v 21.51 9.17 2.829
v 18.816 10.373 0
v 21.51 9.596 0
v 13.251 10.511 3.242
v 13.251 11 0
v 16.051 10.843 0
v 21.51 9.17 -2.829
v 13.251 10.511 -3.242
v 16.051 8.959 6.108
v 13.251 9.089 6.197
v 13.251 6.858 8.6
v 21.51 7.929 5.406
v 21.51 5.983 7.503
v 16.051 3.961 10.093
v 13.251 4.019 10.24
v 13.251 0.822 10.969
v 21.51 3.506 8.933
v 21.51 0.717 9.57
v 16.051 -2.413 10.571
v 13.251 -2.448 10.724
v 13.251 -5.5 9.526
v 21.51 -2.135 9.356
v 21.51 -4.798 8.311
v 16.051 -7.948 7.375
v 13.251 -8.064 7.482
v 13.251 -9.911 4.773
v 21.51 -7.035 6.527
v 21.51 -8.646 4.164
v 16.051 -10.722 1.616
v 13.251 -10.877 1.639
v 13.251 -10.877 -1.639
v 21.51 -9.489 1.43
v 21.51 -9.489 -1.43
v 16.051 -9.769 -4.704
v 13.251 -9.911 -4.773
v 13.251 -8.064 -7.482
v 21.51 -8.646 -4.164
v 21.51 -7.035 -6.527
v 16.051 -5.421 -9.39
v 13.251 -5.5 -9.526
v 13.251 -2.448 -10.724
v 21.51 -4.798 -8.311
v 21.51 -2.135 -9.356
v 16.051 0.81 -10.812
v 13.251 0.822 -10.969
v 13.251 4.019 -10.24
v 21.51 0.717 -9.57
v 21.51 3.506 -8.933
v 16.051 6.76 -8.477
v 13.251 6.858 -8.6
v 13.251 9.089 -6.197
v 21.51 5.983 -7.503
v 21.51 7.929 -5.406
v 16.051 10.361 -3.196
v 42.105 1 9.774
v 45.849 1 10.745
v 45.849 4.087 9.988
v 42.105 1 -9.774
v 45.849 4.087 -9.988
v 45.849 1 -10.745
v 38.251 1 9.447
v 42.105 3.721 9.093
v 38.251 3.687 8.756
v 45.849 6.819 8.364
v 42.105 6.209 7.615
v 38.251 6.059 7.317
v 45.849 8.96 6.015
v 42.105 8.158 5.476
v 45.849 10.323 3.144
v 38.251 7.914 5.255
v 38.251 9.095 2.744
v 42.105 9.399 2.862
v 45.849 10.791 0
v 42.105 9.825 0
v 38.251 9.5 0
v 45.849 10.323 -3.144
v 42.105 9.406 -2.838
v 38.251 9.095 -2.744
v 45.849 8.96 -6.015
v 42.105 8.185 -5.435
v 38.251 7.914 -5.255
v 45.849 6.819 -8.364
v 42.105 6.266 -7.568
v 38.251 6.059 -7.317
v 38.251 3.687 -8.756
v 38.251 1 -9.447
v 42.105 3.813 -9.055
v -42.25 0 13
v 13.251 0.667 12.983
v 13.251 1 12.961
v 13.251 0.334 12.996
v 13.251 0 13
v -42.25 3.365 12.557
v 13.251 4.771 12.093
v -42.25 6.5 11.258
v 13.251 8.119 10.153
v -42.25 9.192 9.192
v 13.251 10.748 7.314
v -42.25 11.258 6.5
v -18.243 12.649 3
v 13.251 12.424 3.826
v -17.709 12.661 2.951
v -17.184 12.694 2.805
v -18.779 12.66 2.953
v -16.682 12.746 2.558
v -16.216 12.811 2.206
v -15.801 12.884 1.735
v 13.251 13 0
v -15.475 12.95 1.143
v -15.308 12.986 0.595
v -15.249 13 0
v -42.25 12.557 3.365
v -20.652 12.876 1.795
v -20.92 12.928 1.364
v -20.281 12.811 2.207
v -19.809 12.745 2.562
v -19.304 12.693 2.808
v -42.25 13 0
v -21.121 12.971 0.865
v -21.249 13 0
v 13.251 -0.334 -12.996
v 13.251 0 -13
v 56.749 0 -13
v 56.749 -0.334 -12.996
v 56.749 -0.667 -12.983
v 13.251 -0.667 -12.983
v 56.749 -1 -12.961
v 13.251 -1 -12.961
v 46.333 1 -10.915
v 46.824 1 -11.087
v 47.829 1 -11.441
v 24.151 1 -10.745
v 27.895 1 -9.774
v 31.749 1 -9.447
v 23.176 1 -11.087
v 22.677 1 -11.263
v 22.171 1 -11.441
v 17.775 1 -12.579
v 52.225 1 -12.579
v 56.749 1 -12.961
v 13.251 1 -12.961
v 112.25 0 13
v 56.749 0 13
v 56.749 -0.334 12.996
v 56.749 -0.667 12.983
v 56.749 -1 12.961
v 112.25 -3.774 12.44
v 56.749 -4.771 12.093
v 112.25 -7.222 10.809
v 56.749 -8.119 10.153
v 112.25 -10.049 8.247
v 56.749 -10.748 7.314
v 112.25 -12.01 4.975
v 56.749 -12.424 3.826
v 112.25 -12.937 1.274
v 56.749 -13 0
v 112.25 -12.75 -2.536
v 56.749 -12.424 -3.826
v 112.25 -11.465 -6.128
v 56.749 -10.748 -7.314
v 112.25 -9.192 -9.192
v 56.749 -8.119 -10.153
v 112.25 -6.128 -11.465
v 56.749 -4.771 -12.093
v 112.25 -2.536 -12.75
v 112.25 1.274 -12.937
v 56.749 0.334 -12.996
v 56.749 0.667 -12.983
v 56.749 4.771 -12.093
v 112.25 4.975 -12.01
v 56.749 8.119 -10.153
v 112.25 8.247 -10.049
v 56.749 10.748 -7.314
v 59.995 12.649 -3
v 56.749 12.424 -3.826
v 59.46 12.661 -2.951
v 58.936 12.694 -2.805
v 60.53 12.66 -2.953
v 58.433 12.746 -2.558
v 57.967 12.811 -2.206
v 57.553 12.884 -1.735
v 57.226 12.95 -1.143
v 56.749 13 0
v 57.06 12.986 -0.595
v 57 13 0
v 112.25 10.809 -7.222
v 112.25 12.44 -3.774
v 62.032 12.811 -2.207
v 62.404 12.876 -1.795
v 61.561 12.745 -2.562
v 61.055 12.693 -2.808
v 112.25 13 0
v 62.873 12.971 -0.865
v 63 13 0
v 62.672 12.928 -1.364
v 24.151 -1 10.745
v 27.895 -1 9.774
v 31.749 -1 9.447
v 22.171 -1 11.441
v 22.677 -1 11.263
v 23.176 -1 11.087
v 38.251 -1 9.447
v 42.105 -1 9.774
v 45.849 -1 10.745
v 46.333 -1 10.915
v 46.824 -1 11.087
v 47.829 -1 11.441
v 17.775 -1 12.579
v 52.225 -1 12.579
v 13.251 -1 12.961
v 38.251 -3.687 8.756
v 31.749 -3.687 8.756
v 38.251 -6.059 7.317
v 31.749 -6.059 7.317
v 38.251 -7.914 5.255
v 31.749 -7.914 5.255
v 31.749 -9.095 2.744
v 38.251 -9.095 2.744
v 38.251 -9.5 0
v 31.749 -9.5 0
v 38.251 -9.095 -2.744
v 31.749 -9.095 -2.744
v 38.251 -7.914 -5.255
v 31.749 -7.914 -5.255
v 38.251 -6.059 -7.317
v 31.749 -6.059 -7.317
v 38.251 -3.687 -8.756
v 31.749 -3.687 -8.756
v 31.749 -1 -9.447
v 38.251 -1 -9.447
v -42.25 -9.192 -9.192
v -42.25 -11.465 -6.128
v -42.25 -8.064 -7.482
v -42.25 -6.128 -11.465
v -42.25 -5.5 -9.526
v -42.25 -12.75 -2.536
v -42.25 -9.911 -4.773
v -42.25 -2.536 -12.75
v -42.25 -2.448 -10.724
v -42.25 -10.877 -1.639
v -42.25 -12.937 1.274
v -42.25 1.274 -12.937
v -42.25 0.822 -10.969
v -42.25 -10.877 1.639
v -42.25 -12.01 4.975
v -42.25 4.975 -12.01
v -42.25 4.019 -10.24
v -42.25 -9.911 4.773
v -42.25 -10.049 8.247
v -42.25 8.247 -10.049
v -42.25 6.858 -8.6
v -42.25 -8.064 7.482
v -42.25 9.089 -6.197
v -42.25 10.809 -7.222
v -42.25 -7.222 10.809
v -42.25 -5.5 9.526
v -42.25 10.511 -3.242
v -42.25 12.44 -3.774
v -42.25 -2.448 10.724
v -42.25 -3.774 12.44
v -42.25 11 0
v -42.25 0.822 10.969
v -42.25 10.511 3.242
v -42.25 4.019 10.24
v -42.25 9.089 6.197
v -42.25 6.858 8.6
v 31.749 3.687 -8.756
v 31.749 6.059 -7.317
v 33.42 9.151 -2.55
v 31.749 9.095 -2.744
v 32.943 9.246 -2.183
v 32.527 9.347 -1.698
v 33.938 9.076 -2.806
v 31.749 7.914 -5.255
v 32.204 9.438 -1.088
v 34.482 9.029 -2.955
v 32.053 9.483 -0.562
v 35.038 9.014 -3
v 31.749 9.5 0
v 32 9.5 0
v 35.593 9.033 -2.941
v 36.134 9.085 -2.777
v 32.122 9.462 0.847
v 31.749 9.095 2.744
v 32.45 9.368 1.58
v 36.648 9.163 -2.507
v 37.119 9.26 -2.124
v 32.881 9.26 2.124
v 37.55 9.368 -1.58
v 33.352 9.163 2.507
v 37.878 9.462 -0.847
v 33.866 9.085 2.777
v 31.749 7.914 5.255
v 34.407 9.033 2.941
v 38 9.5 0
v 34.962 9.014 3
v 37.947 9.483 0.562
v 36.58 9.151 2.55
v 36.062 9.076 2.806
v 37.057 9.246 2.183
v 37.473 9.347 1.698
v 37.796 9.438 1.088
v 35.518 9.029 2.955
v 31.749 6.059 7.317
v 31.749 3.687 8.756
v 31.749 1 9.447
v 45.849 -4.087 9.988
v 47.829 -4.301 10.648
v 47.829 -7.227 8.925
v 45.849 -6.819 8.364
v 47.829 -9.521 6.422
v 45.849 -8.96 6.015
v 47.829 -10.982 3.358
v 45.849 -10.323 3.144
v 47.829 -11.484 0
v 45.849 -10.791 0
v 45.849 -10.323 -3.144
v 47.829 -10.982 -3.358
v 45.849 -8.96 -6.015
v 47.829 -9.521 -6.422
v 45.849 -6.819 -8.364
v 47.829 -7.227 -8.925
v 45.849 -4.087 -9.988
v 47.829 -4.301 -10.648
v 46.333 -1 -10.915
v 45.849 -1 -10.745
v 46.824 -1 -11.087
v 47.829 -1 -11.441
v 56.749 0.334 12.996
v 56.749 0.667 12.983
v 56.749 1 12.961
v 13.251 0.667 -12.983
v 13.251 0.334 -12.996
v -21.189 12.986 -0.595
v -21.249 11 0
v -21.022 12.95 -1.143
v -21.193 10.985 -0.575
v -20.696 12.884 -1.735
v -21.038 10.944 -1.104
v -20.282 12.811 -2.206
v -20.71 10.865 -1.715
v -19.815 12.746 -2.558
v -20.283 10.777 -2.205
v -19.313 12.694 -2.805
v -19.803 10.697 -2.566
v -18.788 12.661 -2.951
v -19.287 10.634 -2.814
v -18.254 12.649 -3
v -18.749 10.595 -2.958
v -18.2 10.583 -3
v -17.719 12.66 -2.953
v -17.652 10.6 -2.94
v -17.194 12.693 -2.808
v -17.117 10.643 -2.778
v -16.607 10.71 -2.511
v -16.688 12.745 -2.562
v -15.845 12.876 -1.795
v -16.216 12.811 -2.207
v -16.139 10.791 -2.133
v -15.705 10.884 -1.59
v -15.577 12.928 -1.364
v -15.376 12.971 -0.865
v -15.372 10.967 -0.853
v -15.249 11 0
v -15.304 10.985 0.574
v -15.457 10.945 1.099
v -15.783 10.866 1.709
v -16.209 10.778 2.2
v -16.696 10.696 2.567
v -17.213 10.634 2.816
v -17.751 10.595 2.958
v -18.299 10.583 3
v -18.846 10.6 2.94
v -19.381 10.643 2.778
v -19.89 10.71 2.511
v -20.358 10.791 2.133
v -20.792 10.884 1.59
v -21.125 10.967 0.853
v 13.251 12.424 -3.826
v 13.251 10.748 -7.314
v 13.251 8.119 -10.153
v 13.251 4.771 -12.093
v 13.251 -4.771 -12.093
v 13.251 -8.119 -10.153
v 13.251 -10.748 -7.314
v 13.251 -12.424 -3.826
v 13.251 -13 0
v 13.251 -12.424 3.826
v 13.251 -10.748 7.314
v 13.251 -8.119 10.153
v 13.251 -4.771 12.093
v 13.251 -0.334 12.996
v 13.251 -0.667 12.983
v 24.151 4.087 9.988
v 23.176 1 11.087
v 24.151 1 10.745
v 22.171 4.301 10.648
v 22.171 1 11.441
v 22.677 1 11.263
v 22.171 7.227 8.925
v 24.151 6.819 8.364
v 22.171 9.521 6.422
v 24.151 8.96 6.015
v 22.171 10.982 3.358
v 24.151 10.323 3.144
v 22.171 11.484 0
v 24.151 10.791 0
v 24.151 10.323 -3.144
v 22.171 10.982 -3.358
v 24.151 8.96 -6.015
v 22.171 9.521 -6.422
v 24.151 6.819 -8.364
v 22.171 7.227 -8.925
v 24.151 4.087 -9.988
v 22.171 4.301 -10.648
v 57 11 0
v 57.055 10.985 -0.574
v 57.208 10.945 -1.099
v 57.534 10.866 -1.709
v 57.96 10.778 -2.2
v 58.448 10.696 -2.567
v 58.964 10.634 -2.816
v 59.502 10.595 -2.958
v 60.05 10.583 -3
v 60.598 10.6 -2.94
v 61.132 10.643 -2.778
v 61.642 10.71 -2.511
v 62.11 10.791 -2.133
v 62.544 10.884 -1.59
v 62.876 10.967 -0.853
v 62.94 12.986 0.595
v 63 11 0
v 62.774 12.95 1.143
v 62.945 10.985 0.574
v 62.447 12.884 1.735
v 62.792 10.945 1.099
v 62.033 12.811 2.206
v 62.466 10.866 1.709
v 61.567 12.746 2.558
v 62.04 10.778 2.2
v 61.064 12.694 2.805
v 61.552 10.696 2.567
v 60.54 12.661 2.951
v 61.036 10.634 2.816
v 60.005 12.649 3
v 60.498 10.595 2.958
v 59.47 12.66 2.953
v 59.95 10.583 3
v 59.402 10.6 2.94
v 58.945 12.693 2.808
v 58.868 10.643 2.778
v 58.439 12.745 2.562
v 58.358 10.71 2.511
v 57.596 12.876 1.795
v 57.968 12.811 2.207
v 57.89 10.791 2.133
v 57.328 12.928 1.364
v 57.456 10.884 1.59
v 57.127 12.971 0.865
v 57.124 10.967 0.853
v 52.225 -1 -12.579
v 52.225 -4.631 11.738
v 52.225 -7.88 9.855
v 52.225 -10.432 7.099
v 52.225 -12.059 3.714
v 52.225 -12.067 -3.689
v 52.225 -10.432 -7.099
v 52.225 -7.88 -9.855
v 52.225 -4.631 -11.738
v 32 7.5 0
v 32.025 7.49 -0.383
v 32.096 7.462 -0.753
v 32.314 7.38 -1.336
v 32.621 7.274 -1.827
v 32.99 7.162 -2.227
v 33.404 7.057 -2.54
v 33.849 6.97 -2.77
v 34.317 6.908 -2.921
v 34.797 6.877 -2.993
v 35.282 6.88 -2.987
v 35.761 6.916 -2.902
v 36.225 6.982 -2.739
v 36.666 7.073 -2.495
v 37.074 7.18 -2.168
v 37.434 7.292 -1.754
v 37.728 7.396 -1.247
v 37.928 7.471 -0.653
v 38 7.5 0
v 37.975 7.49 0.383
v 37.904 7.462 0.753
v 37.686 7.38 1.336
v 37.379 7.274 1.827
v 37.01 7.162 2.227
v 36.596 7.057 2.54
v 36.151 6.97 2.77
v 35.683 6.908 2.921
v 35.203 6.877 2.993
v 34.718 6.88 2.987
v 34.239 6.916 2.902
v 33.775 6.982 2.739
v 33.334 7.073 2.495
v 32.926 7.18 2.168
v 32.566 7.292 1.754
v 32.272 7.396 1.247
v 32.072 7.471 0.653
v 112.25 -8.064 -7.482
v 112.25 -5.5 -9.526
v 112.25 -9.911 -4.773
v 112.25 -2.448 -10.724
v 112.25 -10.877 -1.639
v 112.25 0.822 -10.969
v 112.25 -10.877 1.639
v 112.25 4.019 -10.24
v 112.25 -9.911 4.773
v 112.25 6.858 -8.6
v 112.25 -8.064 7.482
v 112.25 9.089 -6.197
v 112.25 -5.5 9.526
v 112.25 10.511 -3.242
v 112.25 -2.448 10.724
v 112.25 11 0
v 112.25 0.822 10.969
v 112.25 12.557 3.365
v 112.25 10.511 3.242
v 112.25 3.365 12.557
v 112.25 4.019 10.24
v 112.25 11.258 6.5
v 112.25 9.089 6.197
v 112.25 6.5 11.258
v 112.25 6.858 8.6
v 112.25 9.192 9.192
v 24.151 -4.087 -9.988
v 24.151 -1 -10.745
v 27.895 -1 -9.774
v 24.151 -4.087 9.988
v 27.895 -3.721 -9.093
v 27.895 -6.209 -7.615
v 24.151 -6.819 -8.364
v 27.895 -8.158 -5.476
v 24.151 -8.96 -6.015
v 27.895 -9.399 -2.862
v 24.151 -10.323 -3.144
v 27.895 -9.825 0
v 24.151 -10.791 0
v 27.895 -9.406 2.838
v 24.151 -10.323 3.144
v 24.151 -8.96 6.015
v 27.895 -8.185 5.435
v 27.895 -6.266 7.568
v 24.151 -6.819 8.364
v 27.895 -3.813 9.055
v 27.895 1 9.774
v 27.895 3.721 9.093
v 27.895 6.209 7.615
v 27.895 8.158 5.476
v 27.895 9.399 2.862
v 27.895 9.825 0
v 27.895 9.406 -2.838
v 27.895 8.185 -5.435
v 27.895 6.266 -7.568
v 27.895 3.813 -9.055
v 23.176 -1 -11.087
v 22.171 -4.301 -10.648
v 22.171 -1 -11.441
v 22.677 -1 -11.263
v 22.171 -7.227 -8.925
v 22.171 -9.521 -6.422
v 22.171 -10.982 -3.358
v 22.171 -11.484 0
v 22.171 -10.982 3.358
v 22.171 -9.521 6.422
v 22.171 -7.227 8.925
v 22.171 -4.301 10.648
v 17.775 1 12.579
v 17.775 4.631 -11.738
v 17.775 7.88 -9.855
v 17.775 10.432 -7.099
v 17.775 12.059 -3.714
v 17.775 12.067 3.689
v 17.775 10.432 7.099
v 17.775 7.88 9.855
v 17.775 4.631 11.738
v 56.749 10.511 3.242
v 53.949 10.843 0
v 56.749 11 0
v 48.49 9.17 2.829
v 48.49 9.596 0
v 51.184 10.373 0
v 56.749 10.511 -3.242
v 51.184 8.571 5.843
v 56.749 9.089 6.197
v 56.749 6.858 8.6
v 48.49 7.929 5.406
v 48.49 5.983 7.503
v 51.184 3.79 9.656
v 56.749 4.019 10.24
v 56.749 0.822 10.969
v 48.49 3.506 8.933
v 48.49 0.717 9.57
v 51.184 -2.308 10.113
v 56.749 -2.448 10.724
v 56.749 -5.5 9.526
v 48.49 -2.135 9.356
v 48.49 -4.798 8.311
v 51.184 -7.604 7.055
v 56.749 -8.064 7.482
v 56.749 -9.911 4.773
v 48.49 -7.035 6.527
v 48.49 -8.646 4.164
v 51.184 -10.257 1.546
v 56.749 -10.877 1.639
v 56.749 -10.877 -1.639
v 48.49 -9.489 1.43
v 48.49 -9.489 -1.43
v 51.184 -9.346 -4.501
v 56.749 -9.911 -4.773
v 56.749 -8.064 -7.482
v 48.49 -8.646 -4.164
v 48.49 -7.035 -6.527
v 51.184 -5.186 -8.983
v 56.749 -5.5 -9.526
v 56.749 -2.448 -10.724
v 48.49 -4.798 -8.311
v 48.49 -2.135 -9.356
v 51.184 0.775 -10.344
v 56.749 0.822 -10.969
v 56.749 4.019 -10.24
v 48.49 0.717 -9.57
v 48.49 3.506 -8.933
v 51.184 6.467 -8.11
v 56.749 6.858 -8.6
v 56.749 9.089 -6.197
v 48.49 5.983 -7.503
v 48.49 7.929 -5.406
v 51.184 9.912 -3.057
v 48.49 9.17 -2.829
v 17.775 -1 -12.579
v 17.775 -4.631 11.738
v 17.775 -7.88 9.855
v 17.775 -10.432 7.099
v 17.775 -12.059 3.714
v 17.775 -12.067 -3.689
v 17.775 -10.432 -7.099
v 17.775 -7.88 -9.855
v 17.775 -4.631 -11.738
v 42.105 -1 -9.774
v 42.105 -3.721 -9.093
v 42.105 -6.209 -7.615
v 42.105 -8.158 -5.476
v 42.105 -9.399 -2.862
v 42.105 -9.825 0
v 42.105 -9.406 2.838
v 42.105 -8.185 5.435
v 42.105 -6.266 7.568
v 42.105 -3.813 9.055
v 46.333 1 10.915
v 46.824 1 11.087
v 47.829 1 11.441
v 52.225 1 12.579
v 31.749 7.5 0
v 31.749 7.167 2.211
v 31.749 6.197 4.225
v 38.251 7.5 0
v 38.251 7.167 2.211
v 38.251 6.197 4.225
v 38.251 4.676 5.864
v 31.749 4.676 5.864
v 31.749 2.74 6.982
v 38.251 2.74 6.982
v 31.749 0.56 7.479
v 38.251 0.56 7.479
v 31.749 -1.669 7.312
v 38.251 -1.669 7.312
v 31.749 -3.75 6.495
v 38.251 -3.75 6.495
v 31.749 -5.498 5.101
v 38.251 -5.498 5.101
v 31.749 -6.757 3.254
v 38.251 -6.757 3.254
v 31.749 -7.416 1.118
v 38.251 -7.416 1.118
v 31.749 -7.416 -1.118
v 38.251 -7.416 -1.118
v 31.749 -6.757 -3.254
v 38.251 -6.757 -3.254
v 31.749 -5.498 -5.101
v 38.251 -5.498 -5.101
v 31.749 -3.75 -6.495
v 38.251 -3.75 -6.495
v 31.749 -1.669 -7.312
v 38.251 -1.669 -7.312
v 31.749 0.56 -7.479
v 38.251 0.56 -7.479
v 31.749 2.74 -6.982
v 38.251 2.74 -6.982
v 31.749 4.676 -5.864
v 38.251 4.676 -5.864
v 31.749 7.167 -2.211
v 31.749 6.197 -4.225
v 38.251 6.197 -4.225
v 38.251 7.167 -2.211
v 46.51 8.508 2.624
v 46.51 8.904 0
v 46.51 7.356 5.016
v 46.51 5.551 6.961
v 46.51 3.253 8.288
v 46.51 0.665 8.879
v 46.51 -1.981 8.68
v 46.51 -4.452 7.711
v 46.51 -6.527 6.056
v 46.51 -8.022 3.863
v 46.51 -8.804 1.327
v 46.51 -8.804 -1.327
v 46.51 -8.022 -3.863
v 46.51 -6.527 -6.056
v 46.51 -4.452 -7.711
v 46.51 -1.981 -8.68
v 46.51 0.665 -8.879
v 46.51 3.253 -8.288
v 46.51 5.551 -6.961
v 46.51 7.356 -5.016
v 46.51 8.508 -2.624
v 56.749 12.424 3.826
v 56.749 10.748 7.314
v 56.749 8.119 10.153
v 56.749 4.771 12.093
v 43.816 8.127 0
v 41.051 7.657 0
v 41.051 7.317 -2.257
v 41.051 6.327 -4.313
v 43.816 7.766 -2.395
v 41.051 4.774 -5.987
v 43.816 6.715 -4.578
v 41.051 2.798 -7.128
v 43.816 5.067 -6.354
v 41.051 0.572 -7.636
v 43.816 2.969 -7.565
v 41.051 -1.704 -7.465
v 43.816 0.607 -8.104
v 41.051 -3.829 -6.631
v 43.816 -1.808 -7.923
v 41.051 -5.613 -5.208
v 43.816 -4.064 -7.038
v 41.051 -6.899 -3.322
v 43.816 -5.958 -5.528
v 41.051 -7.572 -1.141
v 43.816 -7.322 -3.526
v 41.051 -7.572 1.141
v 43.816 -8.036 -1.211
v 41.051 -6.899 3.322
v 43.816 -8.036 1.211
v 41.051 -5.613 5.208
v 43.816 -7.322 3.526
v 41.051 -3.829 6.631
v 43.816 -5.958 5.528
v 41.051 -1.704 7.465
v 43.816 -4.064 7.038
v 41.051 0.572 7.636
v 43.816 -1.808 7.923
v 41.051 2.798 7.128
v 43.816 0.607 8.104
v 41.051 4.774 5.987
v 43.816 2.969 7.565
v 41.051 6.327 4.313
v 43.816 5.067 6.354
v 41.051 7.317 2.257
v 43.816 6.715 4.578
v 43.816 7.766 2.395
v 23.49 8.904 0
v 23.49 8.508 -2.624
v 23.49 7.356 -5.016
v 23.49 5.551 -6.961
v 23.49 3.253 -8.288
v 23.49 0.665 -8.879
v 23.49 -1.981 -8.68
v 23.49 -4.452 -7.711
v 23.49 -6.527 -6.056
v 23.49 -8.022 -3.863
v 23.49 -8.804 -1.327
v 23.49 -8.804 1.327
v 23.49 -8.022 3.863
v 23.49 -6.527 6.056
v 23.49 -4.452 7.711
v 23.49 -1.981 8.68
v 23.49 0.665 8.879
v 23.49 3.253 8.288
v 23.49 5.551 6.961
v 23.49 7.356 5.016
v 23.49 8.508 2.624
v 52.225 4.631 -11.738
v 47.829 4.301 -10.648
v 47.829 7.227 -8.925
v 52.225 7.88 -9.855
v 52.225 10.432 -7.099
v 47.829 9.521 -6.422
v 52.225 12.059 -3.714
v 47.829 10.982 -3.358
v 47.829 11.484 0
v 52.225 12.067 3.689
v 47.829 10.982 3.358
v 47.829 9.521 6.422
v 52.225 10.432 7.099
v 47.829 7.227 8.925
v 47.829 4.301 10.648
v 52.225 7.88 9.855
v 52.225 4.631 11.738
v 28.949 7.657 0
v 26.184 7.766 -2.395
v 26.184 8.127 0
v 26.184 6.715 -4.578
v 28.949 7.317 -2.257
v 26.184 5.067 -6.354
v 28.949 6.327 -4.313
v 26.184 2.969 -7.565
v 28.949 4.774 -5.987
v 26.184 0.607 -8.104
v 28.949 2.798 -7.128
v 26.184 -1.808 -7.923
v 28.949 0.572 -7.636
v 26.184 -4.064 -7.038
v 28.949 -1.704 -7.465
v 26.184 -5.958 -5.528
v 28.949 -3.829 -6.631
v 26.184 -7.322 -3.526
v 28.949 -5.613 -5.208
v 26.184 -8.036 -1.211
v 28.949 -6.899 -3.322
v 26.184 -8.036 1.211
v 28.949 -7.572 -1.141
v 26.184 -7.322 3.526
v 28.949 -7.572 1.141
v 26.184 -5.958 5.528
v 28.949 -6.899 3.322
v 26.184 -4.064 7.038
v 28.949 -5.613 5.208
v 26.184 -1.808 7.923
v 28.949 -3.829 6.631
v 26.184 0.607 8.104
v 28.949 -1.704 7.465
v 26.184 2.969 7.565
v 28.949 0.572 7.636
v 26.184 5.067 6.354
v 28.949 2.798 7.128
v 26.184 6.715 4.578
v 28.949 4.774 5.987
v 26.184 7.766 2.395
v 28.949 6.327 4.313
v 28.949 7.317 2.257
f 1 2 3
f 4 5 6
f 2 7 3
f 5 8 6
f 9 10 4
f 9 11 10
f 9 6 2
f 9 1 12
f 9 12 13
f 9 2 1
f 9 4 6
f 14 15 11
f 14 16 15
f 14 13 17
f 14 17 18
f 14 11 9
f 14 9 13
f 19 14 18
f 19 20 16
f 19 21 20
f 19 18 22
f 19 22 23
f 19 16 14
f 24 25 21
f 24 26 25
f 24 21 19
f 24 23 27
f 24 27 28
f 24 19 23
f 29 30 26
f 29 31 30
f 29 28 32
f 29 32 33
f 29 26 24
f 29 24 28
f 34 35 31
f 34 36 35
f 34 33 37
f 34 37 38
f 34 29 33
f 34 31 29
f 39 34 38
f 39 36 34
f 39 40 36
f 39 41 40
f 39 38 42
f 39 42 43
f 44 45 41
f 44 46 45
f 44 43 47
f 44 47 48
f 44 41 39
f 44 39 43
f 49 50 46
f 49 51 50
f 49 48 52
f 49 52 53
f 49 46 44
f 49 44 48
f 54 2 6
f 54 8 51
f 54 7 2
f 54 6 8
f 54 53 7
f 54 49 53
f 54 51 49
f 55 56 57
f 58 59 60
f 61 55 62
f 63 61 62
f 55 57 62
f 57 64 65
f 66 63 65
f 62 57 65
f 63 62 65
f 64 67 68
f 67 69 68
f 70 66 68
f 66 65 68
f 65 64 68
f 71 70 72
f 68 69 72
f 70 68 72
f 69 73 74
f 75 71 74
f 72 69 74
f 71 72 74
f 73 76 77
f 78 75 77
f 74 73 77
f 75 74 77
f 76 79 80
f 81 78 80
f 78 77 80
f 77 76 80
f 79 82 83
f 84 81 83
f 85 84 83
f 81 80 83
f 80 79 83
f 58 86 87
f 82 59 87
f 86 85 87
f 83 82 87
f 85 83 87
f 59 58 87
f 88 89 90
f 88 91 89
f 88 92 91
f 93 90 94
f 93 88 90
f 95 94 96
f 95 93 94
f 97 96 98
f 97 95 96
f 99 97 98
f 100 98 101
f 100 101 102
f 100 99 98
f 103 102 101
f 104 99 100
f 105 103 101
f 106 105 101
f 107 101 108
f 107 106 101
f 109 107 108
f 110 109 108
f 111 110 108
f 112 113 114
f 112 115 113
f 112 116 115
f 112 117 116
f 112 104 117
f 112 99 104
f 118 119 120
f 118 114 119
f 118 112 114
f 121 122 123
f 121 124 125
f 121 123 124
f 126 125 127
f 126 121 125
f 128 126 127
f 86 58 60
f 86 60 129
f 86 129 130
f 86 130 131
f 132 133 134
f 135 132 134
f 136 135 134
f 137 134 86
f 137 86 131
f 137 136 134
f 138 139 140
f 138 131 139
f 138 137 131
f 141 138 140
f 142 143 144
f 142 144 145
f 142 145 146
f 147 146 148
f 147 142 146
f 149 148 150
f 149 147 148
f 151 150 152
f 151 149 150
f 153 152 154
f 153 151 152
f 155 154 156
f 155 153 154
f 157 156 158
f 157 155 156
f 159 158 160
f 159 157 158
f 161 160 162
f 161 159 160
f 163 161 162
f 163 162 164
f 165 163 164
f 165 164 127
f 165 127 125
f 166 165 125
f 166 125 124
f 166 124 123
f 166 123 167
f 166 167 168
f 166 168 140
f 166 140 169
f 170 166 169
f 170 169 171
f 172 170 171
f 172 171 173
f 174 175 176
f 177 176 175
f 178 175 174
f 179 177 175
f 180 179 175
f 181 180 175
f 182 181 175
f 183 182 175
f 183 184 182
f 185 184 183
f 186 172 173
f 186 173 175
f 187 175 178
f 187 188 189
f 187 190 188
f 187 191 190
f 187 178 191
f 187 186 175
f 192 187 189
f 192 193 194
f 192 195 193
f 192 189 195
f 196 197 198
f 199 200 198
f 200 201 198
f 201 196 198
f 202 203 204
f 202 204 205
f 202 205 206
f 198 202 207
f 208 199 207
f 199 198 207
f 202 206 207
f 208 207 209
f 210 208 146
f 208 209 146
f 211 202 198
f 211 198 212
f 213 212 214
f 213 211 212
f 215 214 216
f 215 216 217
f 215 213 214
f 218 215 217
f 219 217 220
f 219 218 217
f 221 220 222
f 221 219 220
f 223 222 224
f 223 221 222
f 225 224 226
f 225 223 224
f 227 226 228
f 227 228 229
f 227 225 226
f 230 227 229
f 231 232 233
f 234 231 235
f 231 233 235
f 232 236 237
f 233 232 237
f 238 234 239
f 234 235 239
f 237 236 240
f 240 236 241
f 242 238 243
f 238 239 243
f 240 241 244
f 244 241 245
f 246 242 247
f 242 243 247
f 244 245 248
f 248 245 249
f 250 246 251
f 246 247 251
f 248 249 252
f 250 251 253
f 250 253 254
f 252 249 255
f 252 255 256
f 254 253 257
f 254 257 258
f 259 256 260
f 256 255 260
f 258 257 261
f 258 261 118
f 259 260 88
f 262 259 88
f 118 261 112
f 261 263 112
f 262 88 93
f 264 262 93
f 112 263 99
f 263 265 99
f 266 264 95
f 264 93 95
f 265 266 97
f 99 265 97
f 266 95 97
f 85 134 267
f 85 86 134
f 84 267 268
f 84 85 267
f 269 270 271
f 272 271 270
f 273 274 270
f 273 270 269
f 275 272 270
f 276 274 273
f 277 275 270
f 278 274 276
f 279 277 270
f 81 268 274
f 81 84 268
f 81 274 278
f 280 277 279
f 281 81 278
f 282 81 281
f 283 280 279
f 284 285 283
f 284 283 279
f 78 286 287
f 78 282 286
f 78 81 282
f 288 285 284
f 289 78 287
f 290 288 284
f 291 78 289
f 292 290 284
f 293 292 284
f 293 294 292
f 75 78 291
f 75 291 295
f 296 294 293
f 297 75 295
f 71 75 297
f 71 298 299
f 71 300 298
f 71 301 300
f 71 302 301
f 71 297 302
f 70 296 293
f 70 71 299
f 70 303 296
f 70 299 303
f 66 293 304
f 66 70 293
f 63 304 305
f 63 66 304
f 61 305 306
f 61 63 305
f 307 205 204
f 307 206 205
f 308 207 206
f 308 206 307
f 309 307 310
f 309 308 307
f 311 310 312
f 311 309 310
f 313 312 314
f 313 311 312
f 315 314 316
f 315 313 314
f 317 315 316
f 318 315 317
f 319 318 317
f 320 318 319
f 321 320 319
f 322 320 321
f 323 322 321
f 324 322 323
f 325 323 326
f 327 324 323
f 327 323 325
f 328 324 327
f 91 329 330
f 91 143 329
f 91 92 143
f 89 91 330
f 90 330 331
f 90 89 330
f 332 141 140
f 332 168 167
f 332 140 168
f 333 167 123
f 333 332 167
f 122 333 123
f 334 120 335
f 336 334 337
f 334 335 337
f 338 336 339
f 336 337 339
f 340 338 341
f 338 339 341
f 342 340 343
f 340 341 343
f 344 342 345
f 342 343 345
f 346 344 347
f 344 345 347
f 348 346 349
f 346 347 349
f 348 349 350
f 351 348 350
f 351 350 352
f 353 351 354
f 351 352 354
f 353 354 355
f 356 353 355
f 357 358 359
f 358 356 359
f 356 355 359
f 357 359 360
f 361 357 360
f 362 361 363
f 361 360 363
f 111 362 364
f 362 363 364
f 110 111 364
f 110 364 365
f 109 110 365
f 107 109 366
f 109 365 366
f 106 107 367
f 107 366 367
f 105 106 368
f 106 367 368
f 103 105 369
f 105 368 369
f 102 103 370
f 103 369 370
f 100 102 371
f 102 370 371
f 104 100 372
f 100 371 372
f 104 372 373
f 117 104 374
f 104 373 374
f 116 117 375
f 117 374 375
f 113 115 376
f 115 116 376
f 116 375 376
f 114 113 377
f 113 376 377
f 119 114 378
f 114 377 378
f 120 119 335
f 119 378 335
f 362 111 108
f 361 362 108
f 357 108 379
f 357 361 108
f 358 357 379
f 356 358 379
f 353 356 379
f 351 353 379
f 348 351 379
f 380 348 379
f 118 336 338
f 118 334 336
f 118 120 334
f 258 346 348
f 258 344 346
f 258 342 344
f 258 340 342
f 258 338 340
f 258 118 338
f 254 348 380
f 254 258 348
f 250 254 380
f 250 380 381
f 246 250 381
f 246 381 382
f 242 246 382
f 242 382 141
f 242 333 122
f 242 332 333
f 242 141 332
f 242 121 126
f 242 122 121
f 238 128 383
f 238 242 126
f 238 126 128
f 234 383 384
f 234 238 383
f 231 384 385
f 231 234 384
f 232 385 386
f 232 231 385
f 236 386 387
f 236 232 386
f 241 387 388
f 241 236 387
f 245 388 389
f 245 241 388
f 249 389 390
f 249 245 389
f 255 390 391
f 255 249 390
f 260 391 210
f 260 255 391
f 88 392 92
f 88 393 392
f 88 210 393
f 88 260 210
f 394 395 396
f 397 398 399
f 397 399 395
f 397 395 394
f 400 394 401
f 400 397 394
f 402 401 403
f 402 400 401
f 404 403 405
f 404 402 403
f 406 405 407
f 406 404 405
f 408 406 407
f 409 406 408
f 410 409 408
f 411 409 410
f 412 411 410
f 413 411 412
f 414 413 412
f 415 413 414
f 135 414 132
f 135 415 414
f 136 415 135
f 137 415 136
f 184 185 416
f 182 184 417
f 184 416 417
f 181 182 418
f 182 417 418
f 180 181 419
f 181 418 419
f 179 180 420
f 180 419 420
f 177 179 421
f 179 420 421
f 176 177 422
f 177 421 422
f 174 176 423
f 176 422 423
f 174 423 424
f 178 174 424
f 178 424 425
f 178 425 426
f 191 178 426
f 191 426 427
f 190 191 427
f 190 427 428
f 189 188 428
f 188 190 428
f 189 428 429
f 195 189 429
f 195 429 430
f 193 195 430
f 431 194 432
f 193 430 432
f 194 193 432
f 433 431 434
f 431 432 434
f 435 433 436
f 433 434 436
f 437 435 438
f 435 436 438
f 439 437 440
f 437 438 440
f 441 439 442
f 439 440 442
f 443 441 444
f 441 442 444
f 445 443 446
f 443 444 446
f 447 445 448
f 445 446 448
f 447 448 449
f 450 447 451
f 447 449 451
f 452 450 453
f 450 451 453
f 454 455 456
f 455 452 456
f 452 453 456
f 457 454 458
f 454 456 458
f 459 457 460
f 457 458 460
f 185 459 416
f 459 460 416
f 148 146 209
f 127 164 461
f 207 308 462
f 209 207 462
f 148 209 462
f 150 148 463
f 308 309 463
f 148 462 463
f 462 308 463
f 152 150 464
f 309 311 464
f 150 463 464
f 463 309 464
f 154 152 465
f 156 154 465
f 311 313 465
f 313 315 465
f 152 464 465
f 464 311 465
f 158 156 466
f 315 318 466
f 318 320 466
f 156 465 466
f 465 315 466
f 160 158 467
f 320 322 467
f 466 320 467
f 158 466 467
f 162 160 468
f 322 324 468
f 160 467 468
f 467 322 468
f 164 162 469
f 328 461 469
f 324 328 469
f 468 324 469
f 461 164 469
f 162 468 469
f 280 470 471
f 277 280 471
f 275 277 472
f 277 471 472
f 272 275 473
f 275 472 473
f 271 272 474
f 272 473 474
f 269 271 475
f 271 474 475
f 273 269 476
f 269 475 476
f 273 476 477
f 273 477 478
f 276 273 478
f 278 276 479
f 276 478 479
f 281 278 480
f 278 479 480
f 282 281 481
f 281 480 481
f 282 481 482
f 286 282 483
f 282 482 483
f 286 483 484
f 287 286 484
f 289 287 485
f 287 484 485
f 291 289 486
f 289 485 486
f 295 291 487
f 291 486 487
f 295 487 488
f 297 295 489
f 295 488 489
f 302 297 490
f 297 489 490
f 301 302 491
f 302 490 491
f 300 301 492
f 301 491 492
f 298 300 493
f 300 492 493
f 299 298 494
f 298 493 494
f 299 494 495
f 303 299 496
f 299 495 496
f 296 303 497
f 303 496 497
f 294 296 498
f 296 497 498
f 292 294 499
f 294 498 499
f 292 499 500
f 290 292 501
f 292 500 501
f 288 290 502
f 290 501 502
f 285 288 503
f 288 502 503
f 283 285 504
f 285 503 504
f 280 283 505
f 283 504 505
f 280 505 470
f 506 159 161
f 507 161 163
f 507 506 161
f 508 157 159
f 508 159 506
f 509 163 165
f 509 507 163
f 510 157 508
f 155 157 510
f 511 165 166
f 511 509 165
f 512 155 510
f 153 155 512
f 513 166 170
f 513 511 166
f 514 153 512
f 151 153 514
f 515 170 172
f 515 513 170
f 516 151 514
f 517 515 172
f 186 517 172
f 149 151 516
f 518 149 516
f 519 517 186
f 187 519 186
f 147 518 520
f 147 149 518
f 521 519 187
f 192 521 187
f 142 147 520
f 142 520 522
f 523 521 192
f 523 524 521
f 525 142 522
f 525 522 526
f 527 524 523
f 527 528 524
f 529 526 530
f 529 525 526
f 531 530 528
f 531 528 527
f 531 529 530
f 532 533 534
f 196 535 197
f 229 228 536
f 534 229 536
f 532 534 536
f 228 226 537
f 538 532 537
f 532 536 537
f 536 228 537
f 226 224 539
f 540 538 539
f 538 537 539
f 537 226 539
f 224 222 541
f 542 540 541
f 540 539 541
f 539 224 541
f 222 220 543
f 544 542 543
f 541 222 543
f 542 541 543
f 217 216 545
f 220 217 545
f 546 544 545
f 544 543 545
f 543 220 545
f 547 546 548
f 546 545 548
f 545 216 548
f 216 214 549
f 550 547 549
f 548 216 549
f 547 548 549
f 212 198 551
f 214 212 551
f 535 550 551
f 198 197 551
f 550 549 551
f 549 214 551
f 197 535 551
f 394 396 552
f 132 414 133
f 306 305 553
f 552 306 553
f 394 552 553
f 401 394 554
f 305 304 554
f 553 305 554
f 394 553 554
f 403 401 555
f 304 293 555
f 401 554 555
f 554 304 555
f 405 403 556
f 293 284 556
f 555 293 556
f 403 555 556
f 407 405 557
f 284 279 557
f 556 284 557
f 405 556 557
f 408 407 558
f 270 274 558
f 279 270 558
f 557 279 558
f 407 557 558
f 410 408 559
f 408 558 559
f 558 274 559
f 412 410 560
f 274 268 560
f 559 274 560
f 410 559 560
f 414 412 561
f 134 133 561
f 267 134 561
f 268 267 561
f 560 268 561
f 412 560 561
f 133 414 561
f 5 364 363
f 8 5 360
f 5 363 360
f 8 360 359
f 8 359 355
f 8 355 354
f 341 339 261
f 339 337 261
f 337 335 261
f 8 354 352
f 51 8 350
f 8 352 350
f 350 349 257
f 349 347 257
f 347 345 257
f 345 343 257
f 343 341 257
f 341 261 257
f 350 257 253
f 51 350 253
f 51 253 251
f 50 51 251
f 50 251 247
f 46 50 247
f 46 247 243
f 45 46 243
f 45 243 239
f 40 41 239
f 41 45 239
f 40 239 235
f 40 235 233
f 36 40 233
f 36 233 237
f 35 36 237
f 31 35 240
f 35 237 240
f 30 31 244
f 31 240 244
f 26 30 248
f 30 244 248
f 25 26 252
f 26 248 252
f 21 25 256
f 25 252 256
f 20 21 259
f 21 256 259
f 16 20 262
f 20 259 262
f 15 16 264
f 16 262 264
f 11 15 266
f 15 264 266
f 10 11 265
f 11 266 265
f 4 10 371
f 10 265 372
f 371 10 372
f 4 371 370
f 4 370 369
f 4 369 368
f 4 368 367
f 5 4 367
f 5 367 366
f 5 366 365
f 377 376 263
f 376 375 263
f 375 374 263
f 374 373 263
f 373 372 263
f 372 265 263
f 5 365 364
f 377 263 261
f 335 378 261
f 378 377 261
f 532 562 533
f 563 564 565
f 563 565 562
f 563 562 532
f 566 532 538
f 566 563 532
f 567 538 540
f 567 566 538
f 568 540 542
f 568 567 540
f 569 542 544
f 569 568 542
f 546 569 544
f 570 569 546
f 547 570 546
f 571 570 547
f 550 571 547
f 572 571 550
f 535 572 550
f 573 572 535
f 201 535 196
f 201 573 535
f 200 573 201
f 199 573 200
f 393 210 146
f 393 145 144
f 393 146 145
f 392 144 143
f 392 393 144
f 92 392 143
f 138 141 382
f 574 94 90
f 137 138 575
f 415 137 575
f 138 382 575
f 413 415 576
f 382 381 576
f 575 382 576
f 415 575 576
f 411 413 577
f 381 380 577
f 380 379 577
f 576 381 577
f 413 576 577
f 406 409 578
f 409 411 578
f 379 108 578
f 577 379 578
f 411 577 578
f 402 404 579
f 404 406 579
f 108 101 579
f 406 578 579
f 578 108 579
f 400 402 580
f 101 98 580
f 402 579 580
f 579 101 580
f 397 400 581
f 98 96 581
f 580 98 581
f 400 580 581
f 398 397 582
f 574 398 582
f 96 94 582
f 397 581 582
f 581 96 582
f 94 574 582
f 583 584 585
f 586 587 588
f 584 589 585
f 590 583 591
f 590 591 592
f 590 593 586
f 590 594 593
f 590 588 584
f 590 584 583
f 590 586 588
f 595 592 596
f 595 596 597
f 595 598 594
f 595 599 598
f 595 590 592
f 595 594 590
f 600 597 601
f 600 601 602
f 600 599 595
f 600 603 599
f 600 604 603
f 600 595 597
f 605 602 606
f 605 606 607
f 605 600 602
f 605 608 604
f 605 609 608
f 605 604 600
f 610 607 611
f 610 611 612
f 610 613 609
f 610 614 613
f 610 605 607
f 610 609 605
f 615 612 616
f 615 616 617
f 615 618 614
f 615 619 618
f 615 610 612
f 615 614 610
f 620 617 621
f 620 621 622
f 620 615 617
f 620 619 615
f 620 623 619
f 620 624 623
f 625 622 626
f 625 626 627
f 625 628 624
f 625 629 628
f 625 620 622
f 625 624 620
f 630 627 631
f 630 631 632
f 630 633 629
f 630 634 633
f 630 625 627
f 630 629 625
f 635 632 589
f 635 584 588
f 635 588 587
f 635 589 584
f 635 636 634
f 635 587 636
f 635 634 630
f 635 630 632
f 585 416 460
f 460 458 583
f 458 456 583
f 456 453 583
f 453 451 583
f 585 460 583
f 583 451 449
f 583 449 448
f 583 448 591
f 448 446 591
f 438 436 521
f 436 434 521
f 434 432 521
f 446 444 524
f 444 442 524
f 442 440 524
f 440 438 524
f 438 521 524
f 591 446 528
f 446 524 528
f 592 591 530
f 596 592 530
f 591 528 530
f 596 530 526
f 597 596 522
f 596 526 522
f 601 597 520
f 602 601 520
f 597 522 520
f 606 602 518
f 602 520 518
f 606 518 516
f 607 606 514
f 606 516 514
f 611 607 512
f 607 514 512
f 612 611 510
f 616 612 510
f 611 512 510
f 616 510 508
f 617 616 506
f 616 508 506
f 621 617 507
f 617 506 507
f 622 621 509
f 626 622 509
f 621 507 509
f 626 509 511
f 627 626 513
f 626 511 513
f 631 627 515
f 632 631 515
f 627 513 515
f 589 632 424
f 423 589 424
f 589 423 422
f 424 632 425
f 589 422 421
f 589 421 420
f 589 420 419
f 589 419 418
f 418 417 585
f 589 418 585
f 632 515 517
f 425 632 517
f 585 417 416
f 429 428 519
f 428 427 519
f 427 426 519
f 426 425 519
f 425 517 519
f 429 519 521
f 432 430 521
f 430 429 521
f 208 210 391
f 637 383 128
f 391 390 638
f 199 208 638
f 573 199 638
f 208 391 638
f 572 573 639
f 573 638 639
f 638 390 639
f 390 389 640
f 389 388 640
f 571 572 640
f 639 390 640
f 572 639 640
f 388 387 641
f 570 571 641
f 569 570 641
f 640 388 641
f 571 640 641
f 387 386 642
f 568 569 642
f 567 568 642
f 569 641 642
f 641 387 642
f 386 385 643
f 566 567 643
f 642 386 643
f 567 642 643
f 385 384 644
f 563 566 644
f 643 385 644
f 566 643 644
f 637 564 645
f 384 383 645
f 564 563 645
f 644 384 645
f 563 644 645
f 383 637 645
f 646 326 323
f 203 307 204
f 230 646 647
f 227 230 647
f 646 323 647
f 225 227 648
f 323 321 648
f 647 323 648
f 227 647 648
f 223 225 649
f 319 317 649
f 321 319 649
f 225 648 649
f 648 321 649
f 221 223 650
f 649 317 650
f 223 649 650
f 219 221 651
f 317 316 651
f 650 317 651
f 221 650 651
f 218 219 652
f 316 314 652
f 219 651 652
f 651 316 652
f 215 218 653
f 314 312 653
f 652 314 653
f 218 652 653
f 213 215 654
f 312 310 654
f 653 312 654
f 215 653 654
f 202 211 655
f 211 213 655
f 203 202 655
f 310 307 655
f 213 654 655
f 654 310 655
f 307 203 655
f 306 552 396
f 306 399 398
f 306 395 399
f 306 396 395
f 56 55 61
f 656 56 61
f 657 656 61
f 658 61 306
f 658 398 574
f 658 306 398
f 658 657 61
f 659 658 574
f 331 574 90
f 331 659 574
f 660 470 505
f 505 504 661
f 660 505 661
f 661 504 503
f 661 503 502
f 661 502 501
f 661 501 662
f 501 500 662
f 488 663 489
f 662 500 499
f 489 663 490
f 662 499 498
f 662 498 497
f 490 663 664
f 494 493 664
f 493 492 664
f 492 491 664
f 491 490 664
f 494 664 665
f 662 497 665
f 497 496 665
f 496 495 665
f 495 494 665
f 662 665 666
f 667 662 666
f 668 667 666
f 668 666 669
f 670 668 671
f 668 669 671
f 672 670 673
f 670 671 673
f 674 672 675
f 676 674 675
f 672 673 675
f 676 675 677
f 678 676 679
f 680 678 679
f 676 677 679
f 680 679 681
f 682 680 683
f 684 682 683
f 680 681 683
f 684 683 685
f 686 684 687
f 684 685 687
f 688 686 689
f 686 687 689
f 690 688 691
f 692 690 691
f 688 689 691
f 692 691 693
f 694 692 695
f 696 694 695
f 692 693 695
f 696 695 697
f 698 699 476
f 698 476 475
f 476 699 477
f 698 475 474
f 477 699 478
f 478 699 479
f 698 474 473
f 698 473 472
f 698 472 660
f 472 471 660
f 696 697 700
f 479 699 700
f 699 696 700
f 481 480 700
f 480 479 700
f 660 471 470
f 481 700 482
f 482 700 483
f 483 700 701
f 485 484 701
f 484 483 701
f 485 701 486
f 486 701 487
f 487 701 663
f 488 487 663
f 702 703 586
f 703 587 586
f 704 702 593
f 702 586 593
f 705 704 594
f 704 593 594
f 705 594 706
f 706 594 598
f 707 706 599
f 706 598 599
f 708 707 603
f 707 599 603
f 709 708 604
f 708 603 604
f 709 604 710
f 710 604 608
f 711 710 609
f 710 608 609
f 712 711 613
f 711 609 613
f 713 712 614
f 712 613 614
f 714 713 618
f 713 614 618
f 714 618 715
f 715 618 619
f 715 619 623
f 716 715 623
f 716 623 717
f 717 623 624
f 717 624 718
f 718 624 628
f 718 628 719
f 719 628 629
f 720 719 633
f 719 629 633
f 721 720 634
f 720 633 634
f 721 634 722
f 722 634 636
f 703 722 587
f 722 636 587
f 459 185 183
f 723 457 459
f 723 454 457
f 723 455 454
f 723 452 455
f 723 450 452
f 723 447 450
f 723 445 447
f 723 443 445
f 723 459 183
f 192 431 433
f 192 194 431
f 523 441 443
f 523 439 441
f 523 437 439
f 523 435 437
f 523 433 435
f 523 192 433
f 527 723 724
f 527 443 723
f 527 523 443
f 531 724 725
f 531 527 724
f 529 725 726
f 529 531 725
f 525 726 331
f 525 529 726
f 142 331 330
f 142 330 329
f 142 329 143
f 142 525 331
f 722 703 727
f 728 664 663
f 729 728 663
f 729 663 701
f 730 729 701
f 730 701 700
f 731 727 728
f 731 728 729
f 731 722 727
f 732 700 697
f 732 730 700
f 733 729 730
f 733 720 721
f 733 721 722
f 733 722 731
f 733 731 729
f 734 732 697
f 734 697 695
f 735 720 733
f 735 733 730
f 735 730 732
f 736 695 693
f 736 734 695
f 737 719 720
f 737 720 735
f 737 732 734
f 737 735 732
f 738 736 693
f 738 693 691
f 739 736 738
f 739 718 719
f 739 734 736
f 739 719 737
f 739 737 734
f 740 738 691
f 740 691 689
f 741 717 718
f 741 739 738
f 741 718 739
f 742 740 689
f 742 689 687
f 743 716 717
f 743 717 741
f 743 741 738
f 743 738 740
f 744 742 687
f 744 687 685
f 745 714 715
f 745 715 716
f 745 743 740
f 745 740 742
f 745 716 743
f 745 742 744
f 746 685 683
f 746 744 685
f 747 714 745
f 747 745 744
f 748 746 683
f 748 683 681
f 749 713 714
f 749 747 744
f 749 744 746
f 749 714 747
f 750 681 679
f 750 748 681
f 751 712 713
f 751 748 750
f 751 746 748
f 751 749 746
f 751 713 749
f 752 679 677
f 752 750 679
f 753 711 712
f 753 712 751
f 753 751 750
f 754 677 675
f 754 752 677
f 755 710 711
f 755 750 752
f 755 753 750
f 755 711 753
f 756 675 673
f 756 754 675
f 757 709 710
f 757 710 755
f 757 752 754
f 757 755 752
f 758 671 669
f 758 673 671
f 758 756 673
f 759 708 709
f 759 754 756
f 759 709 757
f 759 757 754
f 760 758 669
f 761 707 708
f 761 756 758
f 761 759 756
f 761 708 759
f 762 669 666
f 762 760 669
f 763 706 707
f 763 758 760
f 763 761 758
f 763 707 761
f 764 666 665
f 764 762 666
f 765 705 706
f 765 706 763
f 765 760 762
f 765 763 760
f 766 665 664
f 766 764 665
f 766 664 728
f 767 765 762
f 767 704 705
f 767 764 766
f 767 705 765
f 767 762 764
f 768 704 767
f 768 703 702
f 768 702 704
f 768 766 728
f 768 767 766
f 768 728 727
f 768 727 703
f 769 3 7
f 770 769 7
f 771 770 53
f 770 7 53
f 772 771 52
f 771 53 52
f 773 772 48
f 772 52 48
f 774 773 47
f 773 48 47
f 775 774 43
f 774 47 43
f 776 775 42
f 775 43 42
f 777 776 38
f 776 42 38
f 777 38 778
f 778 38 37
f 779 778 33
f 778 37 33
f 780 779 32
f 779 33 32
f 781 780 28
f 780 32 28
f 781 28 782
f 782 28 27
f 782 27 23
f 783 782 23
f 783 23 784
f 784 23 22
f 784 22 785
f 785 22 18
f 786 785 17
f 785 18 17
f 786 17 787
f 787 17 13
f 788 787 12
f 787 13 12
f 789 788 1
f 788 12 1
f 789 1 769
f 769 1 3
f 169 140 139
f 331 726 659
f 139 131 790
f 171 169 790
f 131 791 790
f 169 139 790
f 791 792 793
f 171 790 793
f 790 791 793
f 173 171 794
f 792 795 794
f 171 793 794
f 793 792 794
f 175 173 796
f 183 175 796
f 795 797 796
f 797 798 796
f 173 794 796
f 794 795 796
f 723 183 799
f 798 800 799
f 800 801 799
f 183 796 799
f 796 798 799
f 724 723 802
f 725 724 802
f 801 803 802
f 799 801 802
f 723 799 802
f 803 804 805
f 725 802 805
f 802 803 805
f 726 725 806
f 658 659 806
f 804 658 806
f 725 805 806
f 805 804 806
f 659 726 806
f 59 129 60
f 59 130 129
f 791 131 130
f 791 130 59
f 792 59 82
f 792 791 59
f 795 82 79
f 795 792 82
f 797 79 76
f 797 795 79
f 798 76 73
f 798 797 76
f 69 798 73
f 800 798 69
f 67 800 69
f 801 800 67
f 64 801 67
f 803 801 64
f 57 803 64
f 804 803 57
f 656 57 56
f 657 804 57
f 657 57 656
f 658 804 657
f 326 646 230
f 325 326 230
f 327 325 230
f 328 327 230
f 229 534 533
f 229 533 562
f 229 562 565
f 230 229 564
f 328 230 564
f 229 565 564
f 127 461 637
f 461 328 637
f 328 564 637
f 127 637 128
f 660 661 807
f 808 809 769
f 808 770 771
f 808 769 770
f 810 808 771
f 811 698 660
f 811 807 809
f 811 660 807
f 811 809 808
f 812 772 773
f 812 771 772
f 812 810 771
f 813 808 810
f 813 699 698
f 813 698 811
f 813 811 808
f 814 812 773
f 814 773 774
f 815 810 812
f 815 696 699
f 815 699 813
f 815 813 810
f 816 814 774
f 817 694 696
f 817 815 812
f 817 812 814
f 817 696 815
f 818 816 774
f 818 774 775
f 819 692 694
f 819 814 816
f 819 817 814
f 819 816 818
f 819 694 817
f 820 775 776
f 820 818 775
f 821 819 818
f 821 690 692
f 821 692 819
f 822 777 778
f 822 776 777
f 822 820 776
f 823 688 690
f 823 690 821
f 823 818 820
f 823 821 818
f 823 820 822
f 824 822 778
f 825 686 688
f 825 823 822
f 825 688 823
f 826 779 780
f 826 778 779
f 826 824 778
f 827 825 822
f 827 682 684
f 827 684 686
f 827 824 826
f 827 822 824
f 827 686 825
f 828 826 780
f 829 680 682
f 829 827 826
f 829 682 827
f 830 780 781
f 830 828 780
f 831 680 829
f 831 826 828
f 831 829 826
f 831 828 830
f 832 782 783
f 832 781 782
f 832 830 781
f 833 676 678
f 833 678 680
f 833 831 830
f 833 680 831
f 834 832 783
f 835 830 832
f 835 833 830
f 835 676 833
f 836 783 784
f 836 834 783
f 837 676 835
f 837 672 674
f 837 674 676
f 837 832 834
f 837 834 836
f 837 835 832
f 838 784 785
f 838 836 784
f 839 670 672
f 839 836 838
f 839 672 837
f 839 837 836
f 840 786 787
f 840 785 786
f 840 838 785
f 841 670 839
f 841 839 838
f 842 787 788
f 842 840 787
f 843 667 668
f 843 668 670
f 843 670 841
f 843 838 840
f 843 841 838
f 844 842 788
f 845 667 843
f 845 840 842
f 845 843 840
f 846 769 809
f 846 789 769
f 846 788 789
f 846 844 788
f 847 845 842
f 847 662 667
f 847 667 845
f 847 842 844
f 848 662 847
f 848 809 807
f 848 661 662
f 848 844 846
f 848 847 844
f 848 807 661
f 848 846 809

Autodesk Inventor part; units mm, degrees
ref_plane "YZ Plane" through (0, 0, 0) normal (1, 0, 0) x (0, 1, 0)
ref_plane "XZ Plane" through (0, 0, 0) normal (0, 1, 0) x (-1, 0, 0)
ref_plane "XY Plane" through (0, 0, 0) normal (0, 0, 1) x (1, 0, 0)
sketch "Sketch1" plane through (0, 0, 0) normal (0, 0, 1) x (1, 0, 0)
  line L0 (0, 0) -> (70, 0)
  line L1 (23.4899, 8.9035) -> (21.5101, 9.5965)
  line L2 (46.5101, 8.9035) -> (48.4899, 9.5965)
  arc A0 (21.5101, 9.5965) -> (13.2514, 11) centre (13.2514, -14) ccw
  arc A1 (23.4899, 8.9035) -> (31.7486, 7.5) centre (31.7486, 32.5) ccw
  arc A2 (38.2514, 7.5) -> (46.5101, 8.9035) centre (38.2514, 32.5) ccw
  arc A3 (56.7486, 11) -> (48.4899, 9.5965) centre (56.7486, -14) ccw
  arc A4 (22.1708, 11.4842) -> (13.2514, 13) centre (13.2514, -14) ccw
  line L3 (22.1708, 11.4842) -> (24.1506, 10.7913)
  arc A5 (24.1506, 10.7913) -> (31.7486, 9.5) centre (31.7486, 32.5) ccw
  arc A6 (38.2514, 9.5) -> (45.8494, 10.7913) centre (38.2514, 32.5) ccw
  line L4 (45.8494, 10.7913) -> (47.8292, 11.4842)
  arc A7 (56.7486, 13) -> (47.8292, 11.4842) centre (56.7486, -14) ccw
  line L5 (31.7486, 9.5) -> (38.2514, 9.5)
  line L6 (31.7486, 7.5) -> (38.2514, 7.5)
  line L7 (-42.25, 13) -> (-42.25, 11)
  line L8 (112.25, 13) -> (112.25, 11)
  line L9 (56.7486, 13) -> (112.25, 13)
  line L10 (56.7486, 11) -> (112.25, 11)
  line L11 (13.2514, 13) -> (-42.25, 13)
  line L12 (13.2514, 11) -> (-42.25, 11)
  point P0 (17.5, 11)
  point P1 (52.5, 11)
  point P2 (42.5, 7.5)
  point P3 (27.5, 7.5)
  dimension "d8" = 25
  dimension "d43" = 154.5
revolve "Revolution1" add sketch "Sketch1" angle 360 about axis through (0, 0, 0) along (1, 0, 0)
sketch "Sketch3" plane through (0, 0, 0) normal (0, 1, 0) x (-1, 0, 0)
  circle A0 centre (-35, 0) radius 3
  line L0 (-70, 11) -> (-70, -11) projected
  line L1 (-56.7486, 11) -> (-56.7486, -11) projected
  line L2 (-70, 0) -> (-60, 0)
  circle A1 centre (-60, 0) radius 3
  line L3 (-13.2514, 11) -> (-13.2514, -11) projected
  circle A2 centre (18.2486, 0) radius 3
  dimension "d12" = 6
  dimension "d13" = 10
  dimension "d14" = 6
  dimension "d51" = 6
extrude "Extrusion1" cut sketch "Sketch3" along normal blind 20
sketch "Sketch4" plane through (0, 0, 0) normal (0, 1, 0) x (-1, 0, 0)
  line L0 (-56.7486, -13) -> (-13.2514, -13)
  arc A0 (-56.7486, -12) -> (-48.1595, -10.5403) centre (-56.7486, 14) ccw
  line L1 (-48.1595, -10.5403) -> (-46.1798, -9.8474)
  arc A1 (-38.2514, -8.5) -> (-46.1798, -9.8474) centre (-38.2514, -32.5) ccw
  line L2 (-31.7486, -8.5) -> (-38.2514, -8.5)
  arc A2 (-23.8202, -9.8474) -> (-31.7486, -8.5) centre (-31.7486, -32.5) ccw
  line L3 (-23.8202, -9.8474) -> (-21.8405, -10.5403)
  arc A3 (-21.8405, -10.5403) -> (-13.2514, -12) centre (-13.2514, 14) ccw
  line L4 (-56.7486, -13) -> (-56.7486, -12)
  line L5 (-13.2514, -12) -> (-13.2514, -13)
  point P0 (0, 0)
  point P1 (-22.1708, -11.4842)
  point P2 (-38.2514, -9.5)
  point P3 (-45.8494, -10.7913)
  point P4 (-47.8292, -11.4842)
  point P5 (-38.2514, -8.5)
  point P6 (-48.1595, -10.5403)
extrude "Extrusion3" add sketch "Sketch4" along normal mid plane 2
mirror "Mirror1" about plane through (0, 0, 0) normal (0, 0, 1) of "Extrusion3"
sketch "Sketch6" plane through (-42.25, 0, 0) normal (-1, 0, 0) x (0, 0, 1)
  line L0 (13, 1) -> (13, 0) projected
  circle A0 centre (0, 0) radius 13
  circle A1 centre (0, 0) radius 15
  dimension "d46" = 30
extrude "Extrusion6" cut sketch "Sketch6" against normal up to surface (154.5 mm away)
properties part number "Venturi Valve"
